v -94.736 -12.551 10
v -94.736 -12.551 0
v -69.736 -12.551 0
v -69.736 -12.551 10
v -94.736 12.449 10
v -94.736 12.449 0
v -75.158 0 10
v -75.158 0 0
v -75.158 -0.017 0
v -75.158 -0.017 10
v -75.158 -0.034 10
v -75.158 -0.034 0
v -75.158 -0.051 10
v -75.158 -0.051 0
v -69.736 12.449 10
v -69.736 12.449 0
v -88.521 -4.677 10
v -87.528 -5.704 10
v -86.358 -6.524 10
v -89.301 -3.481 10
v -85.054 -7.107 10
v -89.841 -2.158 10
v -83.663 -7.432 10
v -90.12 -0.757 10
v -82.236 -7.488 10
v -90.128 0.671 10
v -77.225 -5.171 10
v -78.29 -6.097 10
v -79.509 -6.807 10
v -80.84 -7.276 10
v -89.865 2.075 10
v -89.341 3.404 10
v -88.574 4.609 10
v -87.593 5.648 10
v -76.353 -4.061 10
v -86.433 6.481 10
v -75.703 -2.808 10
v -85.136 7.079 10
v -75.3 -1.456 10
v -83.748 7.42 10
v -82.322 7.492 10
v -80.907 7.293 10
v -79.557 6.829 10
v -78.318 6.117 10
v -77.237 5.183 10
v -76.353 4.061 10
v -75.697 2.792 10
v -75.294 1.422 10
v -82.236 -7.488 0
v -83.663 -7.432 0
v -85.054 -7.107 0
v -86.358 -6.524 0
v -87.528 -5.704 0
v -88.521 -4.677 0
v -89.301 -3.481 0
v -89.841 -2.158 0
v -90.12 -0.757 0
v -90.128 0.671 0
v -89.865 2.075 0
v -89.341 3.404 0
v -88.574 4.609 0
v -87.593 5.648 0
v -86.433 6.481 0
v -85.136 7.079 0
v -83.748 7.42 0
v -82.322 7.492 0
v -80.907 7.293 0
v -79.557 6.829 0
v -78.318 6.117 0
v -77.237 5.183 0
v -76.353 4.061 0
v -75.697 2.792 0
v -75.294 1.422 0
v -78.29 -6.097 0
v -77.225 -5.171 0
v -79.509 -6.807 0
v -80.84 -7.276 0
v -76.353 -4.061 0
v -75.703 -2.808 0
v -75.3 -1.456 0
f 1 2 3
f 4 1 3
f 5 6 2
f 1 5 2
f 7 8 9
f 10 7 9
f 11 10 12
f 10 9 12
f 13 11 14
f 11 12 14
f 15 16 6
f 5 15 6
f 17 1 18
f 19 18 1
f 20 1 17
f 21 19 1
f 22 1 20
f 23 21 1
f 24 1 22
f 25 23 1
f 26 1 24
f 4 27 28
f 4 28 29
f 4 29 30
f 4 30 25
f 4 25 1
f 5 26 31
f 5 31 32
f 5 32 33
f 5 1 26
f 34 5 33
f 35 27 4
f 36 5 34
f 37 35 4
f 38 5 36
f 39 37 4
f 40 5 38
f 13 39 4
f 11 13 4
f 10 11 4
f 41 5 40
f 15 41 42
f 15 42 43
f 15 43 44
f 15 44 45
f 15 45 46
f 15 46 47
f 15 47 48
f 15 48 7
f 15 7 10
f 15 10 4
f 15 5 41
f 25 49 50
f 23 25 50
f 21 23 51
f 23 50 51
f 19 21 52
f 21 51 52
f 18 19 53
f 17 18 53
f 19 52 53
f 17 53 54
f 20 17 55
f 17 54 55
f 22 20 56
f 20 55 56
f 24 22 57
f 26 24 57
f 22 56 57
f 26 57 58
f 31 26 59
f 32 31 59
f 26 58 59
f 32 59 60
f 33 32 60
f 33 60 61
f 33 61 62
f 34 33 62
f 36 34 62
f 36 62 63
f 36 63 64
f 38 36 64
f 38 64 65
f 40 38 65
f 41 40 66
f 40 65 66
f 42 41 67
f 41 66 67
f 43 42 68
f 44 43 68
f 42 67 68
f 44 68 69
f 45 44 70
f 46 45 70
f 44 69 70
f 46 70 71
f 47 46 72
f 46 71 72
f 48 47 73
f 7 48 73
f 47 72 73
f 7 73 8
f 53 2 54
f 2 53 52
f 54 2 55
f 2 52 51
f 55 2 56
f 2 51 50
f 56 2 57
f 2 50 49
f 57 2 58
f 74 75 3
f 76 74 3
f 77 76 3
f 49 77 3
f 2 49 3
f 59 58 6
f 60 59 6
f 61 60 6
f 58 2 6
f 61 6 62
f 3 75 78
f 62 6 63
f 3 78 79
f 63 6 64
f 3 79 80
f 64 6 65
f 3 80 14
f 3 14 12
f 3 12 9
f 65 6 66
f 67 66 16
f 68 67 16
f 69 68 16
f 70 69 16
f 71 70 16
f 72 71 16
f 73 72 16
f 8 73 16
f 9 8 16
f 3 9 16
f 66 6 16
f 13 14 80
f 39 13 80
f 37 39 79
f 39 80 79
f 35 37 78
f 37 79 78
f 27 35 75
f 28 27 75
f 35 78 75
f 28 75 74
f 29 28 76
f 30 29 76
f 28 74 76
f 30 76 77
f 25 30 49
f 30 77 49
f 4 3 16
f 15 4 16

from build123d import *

# Parameters (mm, degrees)
F1_DEPTH = 10


with BuildPart() as f1:
    # F0 (on Top) → F1 (new body)
    with BuildSketch(Plane.XY):
        with BuildLine():
            Line((-69.7358559817, 12.4485804441), (-94.7358559817, 12.4485804441))
            Line((-94.7358559817, 12.4485804441), (-94.7358559817, -12.5514195559))
            Line((-94.7358559817, -12.5514195559), (-82.2358559817, -12.5514195559))
            Line((-82.2358559817, -12.5514195559), (-82.2358559817, -7.4881173271))
            ThreePointArc((-82.2358559817, -7.4881173271), (-88.1083383981, 5.1519349585), (-75.1578736305, 0))
            ThreePointArc((-75.1578736305, 0), (-75.1579176973, -0.025709929), (-75.1580498973, -0.0514195559))
            Line((-75.1580498973, -0.0514195559), (-69.7358559817, -0.0514195559))
            Line((-69.7358559817, -0.0514195559), (-69.7358559817, 12.4485804441))
        make_face()
        with BuildLine():
            Line((-69.7358559817, -12.5514195559), (-69.7358559817, -0.0514195559))
            Line((-69.7358559817, -0.0514195559), (-75.1580498973, -0.0514195559))
            ThreePointArc((-75.1580498973, -0.0514195559), (-77.2251016718, -5.1705888296), (-82.2358559817, -7.4881173271))
            Line((-82.2358559817, -7.4881173271), (-82.2358559817, -12.5514195559))
            Line((-82.2358559817, -12.5514195559), (-69.7358559817, -12.5514195559))
        make_face()
    extrude(amount=F1_DEPTH)


solid = f1.part
